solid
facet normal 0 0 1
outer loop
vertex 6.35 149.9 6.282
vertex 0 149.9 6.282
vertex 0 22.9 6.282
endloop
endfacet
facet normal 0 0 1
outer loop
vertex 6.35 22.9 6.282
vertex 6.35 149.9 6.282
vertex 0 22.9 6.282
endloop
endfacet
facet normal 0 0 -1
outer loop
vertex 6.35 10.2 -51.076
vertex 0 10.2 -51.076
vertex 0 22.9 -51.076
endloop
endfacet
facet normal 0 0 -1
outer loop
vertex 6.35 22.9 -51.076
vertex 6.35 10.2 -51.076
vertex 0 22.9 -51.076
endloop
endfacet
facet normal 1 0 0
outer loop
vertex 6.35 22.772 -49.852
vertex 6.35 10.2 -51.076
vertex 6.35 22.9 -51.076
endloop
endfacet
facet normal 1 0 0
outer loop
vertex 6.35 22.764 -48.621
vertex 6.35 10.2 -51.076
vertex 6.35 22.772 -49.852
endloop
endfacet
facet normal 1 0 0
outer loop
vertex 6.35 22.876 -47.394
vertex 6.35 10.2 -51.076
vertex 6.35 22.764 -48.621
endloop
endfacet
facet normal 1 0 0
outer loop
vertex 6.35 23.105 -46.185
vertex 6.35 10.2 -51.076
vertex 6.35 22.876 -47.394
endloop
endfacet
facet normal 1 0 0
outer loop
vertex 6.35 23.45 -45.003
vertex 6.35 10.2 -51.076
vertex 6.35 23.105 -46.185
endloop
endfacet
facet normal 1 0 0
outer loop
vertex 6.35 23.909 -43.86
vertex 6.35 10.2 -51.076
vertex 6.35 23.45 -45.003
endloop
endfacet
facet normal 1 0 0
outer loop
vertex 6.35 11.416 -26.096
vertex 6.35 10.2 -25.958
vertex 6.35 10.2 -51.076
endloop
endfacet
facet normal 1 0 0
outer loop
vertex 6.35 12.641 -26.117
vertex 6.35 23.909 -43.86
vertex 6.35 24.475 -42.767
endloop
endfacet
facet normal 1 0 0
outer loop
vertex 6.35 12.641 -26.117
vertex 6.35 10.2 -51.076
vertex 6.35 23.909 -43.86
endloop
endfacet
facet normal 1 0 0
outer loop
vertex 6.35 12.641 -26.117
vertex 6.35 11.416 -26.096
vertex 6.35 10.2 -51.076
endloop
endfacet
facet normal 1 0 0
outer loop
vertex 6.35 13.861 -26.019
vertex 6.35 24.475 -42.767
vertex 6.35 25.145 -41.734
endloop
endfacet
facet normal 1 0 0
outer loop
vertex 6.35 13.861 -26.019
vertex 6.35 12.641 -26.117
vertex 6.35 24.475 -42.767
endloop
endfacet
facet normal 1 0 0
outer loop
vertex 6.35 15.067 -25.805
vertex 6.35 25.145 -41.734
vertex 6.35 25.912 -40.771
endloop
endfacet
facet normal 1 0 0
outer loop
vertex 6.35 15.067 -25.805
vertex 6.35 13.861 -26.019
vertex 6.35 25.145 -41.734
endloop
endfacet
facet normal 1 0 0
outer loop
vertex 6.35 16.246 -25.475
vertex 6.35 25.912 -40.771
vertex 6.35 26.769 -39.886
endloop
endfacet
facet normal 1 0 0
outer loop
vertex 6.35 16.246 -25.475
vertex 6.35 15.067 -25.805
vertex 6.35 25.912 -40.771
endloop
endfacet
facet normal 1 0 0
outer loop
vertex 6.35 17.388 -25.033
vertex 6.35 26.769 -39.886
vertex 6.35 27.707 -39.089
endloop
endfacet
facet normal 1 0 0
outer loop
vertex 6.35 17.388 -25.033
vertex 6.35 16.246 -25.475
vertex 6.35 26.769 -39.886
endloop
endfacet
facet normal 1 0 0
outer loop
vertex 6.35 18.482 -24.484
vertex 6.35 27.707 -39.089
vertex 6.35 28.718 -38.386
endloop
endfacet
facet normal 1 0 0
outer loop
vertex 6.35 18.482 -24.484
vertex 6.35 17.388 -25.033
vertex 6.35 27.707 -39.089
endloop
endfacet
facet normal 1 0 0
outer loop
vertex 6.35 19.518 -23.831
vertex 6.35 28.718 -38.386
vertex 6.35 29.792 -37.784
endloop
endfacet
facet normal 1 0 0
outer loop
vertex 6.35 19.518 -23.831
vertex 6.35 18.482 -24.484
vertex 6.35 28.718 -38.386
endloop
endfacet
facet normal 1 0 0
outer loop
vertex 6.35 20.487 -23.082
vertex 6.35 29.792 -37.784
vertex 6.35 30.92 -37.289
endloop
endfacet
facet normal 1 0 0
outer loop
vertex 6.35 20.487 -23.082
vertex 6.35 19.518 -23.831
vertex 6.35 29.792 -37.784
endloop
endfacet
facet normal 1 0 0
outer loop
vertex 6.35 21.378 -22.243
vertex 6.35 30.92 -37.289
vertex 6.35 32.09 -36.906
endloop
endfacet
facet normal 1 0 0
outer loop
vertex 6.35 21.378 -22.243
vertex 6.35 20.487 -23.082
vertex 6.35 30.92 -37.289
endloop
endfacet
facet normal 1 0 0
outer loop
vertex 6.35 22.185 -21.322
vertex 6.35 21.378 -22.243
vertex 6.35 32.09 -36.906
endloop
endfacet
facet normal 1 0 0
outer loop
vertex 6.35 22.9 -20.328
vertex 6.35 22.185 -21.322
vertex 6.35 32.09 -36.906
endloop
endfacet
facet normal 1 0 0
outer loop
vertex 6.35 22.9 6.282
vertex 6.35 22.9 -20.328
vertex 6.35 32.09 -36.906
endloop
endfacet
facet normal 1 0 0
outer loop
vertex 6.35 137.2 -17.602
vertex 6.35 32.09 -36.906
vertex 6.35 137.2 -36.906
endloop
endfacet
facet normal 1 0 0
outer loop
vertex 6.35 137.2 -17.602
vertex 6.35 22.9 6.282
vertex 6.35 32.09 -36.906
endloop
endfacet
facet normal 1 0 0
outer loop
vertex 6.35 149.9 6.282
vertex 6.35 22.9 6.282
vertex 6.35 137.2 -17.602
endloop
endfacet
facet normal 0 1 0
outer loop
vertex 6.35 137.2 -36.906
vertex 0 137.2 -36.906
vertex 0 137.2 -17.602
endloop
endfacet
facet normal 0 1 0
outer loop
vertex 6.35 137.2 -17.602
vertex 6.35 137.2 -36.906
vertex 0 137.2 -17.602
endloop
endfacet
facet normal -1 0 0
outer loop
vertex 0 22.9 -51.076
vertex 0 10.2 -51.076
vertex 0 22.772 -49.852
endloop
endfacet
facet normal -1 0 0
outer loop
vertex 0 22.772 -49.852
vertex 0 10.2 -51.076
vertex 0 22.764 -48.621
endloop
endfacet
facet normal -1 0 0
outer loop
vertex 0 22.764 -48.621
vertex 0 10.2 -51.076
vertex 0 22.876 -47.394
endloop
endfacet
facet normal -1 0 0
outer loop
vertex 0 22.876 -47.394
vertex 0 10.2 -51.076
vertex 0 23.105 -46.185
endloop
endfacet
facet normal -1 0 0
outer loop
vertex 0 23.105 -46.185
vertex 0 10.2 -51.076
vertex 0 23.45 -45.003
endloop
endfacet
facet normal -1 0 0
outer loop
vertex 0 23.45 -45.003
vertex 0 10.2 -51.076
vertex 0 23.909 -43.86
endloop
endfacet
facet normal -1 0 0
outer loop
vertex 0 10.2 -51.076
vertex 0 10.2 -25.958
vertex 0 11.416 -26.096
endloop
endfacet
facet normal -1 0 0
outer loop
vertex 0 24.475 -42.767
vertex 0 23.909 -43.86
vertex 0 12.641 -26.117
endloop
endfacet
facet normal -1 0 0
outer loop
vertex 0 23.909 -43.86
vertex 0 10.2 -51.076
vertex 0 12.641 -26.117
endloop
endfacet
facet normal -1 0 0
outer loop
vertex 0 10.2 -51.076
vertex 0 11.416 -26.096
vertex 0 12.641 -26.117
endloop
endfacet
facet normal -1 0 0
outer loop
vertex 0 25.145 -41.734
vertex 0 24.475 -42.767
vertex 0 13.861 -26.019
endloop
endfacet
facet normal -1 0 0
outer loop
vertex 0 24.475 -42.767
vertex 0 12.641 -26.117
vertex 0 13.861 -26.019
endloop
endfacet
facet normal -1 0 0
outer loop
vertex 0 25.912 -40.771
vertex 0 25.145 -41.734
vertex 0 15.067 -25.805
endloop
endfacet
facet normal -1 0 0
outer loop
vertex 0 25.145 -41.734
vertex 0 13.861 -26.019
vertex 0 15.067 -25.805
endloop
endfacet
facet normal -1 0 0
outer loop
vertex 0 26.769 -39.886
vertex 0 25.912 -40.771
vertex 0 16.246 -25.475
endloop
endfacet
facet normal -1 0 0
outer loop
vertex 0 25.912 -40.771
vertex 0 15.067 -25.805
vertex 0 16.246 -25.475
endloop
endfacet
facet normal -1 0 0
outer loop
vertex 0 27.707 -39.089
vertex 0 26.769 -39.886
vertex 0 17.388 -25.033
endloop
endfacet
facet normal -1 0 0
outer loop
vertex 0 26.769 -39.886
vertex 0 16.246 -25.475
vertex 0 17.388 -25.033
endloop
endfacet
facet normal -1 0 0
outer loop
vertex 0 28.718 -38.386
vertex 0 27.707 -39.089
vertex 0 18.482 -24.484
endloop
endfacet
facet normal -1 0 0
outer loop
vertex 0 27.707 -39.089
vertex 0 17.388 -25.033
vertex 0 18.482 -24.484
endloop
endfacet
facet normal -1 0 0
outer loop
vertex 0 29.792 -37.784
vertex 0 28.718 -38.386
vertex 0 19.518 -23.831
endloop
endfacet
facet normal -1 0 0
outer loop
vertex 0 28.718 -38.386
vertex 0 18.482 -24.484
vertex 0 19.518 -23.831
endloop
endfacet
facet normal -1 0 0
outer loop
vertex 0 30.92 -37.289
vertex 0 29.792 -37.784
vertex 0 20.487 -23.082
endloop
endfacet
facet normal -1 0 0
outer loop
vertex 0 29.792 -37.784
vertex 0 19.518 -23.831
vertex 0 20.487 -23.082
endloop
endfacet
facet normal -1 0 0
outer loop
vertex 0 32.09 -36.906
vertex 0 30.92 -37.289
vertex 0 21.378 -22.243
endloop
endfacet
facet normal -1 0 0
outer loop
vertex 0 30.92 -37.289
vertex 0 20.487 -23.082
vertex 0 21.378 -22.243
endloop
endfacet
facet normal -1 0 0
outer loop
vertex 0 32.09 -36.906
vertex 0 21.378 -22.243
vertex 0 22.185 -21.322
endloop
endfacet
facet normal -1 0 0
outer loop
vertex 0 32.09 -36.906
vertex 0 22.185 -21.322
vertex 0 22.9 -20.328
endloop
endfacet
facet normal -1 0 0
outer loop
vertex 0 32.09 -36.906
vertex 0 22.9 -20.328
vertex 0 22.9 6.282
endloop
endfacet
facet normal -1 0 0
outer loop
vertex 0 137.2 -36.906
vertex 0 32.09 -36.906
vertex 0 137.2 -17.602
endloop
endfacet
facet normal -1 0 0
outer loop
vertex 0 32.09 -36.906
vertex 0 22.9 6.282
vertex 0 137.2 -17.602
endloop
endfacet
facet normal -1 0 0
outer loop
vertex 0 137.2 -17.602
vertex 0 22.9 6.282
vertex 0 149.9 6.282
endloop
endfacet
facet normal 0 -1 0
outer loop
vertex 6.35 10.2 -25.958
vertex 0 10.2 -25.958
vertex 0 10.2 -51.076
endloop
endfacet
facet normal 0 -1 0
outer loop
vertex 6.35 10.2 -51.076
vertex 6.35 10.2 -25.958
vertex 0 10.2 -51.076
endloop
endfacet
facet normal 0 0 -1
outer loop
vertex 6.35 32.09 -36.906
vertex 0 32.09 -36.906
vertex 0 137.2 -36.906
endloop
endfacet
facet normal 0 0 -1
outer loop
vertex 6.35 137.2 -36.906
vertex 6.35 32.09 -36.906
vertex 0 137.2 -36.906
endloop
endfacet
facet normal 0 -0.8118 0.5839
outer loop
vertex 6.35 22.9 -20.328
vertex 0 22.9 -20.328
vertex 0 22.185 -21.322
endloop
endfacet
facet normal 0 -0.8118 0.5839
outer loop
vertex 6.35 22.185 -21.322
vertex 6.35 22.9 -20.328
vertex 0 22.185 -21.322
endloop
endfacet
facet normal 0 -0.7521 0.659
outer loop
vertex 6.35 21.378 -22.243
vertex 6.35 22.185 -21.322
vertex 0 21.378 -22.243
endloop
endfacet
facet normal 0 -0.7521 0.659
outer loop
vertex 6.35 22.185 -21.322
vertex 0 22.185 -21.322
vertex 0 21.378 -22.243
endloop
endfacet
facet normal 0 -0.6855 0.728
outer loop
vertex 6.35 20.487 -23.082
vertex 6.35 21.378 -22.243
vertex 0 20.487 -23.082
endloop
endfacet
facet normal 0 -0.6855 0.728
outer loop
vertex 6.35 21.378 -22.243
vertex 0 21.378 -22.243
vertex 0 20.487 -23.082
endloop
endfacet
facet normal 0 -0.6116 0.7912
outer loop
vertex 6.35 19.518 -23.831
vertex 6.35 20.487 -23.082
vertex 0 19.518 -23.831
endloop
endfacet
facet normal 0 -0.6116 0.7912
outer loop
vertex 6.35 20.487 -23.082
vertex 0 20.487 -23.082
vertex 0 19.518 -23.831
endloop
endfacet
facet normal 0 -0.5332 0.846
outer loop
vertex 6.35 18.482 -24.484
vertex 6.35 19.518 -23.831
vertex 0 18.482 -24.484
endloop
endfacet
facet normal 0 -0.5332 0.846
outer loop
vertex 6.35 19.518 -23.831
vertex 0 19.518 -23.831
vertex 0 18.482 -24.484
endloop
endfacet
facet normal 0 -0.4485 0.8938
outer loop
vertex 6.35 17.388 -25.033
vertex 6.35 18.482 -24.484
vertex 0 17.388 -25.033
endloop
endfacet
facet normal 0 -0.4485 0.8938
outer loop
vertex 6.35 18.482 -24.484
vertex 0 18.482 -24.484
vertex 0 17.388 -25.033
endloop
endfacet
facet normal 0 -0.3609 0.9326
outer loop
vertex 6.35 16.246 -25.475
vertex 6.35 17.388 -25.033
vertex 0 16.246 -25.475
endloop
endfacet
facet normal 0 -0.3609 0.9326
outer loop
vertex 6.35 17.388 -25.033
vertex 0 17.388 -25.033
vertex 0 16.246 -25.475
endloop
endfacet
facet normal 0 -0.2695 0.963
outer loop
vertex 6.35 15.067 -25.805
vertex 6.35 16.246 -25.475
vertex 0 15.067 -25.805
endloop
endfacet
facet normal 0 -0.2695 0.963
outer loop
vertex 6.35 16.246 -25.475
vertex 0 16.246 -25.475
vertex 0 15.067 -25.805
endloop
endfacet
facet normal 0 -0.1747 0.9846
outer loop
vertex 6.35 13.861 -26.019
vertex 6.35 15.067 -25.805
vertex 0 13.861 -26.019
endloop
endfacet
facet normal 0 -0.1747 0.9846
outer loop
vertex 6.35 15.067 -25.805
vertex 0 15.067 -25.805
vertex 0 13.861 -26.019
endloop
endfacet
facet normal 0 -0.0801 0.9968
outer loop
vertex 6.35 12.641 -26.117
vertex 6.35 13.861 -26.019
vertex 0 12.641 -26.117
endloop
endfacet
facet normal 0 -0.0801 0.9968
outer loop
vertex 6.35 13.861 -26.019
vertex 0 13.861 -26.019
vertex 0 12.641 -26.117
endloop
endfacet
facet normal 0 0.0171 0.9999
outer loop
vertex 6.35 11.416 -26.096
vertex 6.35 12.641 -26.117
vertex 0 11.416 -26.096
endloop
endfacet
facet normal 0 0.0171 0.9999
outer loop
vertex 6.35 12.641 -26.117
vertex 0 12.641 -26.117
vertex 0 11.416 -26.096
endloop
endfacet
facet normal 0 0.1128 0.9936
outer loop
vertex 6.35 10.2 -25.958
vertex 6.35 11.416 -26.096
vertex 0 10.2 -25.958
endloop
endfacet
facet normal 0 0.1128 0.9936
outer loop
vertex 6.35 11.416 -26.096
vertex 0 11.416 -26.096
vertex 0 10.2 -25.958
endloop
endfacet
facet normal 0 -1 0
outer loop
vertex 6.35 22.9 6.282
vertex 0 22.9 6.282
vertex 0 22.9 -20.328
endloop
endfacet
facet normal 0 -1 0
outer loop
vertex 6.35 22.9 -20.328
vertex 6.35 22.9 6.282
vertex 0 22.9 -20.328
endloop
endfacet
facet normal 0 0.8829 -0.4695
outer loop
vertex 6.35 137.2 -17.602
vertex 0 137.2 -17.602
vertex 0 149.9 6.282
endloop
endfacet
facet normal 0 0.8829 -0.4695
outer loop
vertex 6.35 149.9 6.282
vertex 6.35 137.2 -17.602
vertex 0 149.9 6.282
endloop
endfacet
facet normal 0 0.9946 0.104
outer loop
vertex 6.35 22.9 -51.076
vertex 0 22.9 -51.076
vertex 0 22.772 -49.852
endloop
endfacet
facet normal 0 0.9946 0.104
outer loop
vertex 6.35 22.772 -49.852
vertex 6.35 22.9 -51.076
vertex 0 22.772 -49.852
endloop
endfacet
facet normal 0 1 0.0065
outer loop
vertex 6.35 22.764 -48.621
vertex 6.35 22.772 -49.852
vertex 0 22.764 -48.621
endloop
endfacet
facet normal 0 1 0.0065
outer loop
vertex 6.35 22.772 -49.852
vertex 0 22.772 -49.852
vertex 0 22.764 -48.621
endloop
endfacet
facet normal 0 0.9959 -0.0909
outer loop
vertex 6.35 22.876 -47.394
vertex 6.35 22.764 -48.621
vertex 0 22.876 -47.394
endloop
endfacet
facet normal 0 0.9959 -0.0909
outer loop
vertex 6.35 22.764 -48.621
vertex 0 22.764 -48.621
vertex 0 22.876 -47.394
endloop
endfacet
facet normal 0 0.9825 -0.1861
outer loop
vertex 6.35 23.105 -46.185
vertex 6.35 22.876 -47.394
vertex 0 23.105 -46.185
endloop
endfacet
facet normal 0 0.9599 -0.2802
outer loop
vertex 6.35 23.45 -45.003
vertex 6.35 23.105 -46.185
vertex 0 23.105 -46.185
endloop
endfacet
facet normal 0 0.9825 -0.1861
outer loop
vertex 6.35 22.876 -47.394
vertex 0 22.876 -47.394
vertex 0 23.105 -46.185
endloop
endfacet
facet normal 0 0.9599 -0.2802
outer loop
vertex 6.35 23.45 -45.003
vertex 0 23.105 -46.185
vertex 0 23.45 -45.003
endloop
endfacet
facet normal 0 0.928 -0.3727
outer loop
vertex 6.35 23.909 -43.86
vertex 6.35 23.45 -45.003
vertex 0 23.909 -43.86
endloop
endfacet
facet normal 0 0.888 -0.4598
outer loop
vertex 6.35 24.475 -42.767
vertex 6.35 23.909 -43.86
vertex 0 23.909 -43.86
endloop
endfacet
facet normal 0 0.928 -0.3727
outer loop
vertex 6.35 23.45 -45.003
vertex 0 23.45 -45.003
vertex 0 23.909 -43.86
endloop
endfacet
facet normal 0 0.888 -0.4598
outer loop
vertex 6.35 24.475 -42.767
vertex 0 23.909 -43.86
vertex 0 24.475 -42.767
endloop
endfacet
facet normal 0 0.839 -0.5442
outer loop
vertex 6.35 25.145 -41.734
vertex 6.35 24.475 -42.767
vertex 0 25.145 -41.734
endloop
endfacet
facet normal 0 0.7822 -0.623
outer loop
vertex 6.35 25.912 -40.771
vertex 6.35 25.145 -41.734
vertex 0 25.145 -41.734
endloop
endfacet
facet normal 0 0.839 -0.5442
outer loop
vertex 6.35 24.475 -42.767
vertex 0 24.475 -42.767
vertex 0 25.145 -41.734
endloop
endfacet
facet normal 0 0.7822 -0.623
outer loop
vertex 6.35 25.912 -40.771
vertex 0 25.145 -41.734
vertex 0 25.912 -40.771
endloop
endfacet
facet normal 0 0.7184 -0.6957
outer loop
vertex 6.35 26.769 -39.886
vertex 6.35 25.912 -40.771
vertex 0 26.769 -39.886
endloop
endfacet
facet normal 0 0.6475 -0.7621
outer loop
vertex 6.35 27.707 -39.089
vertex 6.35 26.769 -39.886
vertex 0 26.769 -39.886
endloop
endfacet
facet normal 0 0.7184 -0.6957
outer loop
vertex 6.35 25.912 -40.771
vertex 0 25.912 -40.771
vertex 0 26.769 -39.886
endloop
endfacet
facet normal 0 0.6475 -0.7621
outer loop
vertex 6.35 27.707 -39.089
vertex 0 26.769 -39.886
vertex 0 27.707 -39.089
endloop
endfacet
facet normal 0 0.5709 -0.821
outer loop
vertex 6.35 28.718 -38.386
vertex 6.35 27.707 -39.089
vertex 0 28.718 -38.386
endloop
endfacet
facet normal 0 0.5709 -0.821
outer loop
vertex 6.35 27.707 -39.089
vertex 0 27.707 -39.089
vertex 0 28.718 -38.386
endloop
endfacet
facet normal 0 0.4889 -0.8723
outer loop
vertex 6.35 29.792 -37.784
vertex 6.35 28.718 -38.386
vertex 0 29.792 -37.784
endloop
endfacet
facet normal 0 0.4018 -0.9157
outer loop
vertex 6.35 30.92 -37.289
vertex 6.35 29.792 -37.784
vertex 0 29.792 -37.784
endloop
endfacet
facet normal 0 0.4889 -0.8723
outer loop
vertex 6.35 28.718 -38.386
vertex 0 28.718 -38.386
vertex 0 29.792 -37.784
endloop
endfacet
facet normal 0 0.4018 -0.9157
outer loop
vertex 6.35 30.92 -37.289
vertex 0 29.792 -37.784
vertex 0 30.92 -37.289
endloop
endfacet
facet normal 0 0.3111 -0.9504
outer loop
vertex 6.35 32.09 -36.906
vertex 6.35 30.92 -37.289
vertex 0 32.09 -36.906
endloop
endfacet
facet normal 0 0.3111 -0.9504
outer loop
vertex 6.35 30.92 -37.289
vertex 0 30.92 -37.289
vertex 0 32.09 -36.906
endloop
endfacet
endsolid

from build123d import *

# Parameters (mm, degrees)
F1_DEPTH = 6.35


# Not quite as in the source:
# - a feature names something its author has since deleted; it is built from what else it names


with BuildPart() as f1:
    # F0 (on Right) → F1 (new body)
    with BuildSketch(Plane.YZ):
        with BuildLine():
            Line((10.1997445822, -25.9578457783), (10.1997445822, -51.0764221646))
            Line((10.1997445822, -51.0764221646), (22.8997445822, -51.0764221646))
            ThreePointArc((22.8997445822, -51.0764221646), (24.7978912955, -42.2422146629), (32.0898325185, -36.9061321742))
            Line((32.0898325185, -36.9061321742), (137.1997445822, -36.9061321742))
            Line((137.1997445822, -36.9061321742), (137.2000693373, -17.6021321769))
            Line((137.2000693373, -17.6021321769), (149.8997445822, 6.2824831575))
            Line((149.8997445822, 6.2824831575), (137.1997445822, 6.2824831575))
            Line((137.1997445822, 6.2824831575), (22.8997445822, 6.2824831575))
            Line((22.8997445822, 6.2824831575), (22.8997445822, -20.3278172679))
            ThreePointArc((22.8997445822, -20.3278172679), (17.3877746683, -25.0332272954), (10.1997445822, -25.9578457783))
        make_face()
    extrude(amount=F1_DEPTH)


solid = f1.part
